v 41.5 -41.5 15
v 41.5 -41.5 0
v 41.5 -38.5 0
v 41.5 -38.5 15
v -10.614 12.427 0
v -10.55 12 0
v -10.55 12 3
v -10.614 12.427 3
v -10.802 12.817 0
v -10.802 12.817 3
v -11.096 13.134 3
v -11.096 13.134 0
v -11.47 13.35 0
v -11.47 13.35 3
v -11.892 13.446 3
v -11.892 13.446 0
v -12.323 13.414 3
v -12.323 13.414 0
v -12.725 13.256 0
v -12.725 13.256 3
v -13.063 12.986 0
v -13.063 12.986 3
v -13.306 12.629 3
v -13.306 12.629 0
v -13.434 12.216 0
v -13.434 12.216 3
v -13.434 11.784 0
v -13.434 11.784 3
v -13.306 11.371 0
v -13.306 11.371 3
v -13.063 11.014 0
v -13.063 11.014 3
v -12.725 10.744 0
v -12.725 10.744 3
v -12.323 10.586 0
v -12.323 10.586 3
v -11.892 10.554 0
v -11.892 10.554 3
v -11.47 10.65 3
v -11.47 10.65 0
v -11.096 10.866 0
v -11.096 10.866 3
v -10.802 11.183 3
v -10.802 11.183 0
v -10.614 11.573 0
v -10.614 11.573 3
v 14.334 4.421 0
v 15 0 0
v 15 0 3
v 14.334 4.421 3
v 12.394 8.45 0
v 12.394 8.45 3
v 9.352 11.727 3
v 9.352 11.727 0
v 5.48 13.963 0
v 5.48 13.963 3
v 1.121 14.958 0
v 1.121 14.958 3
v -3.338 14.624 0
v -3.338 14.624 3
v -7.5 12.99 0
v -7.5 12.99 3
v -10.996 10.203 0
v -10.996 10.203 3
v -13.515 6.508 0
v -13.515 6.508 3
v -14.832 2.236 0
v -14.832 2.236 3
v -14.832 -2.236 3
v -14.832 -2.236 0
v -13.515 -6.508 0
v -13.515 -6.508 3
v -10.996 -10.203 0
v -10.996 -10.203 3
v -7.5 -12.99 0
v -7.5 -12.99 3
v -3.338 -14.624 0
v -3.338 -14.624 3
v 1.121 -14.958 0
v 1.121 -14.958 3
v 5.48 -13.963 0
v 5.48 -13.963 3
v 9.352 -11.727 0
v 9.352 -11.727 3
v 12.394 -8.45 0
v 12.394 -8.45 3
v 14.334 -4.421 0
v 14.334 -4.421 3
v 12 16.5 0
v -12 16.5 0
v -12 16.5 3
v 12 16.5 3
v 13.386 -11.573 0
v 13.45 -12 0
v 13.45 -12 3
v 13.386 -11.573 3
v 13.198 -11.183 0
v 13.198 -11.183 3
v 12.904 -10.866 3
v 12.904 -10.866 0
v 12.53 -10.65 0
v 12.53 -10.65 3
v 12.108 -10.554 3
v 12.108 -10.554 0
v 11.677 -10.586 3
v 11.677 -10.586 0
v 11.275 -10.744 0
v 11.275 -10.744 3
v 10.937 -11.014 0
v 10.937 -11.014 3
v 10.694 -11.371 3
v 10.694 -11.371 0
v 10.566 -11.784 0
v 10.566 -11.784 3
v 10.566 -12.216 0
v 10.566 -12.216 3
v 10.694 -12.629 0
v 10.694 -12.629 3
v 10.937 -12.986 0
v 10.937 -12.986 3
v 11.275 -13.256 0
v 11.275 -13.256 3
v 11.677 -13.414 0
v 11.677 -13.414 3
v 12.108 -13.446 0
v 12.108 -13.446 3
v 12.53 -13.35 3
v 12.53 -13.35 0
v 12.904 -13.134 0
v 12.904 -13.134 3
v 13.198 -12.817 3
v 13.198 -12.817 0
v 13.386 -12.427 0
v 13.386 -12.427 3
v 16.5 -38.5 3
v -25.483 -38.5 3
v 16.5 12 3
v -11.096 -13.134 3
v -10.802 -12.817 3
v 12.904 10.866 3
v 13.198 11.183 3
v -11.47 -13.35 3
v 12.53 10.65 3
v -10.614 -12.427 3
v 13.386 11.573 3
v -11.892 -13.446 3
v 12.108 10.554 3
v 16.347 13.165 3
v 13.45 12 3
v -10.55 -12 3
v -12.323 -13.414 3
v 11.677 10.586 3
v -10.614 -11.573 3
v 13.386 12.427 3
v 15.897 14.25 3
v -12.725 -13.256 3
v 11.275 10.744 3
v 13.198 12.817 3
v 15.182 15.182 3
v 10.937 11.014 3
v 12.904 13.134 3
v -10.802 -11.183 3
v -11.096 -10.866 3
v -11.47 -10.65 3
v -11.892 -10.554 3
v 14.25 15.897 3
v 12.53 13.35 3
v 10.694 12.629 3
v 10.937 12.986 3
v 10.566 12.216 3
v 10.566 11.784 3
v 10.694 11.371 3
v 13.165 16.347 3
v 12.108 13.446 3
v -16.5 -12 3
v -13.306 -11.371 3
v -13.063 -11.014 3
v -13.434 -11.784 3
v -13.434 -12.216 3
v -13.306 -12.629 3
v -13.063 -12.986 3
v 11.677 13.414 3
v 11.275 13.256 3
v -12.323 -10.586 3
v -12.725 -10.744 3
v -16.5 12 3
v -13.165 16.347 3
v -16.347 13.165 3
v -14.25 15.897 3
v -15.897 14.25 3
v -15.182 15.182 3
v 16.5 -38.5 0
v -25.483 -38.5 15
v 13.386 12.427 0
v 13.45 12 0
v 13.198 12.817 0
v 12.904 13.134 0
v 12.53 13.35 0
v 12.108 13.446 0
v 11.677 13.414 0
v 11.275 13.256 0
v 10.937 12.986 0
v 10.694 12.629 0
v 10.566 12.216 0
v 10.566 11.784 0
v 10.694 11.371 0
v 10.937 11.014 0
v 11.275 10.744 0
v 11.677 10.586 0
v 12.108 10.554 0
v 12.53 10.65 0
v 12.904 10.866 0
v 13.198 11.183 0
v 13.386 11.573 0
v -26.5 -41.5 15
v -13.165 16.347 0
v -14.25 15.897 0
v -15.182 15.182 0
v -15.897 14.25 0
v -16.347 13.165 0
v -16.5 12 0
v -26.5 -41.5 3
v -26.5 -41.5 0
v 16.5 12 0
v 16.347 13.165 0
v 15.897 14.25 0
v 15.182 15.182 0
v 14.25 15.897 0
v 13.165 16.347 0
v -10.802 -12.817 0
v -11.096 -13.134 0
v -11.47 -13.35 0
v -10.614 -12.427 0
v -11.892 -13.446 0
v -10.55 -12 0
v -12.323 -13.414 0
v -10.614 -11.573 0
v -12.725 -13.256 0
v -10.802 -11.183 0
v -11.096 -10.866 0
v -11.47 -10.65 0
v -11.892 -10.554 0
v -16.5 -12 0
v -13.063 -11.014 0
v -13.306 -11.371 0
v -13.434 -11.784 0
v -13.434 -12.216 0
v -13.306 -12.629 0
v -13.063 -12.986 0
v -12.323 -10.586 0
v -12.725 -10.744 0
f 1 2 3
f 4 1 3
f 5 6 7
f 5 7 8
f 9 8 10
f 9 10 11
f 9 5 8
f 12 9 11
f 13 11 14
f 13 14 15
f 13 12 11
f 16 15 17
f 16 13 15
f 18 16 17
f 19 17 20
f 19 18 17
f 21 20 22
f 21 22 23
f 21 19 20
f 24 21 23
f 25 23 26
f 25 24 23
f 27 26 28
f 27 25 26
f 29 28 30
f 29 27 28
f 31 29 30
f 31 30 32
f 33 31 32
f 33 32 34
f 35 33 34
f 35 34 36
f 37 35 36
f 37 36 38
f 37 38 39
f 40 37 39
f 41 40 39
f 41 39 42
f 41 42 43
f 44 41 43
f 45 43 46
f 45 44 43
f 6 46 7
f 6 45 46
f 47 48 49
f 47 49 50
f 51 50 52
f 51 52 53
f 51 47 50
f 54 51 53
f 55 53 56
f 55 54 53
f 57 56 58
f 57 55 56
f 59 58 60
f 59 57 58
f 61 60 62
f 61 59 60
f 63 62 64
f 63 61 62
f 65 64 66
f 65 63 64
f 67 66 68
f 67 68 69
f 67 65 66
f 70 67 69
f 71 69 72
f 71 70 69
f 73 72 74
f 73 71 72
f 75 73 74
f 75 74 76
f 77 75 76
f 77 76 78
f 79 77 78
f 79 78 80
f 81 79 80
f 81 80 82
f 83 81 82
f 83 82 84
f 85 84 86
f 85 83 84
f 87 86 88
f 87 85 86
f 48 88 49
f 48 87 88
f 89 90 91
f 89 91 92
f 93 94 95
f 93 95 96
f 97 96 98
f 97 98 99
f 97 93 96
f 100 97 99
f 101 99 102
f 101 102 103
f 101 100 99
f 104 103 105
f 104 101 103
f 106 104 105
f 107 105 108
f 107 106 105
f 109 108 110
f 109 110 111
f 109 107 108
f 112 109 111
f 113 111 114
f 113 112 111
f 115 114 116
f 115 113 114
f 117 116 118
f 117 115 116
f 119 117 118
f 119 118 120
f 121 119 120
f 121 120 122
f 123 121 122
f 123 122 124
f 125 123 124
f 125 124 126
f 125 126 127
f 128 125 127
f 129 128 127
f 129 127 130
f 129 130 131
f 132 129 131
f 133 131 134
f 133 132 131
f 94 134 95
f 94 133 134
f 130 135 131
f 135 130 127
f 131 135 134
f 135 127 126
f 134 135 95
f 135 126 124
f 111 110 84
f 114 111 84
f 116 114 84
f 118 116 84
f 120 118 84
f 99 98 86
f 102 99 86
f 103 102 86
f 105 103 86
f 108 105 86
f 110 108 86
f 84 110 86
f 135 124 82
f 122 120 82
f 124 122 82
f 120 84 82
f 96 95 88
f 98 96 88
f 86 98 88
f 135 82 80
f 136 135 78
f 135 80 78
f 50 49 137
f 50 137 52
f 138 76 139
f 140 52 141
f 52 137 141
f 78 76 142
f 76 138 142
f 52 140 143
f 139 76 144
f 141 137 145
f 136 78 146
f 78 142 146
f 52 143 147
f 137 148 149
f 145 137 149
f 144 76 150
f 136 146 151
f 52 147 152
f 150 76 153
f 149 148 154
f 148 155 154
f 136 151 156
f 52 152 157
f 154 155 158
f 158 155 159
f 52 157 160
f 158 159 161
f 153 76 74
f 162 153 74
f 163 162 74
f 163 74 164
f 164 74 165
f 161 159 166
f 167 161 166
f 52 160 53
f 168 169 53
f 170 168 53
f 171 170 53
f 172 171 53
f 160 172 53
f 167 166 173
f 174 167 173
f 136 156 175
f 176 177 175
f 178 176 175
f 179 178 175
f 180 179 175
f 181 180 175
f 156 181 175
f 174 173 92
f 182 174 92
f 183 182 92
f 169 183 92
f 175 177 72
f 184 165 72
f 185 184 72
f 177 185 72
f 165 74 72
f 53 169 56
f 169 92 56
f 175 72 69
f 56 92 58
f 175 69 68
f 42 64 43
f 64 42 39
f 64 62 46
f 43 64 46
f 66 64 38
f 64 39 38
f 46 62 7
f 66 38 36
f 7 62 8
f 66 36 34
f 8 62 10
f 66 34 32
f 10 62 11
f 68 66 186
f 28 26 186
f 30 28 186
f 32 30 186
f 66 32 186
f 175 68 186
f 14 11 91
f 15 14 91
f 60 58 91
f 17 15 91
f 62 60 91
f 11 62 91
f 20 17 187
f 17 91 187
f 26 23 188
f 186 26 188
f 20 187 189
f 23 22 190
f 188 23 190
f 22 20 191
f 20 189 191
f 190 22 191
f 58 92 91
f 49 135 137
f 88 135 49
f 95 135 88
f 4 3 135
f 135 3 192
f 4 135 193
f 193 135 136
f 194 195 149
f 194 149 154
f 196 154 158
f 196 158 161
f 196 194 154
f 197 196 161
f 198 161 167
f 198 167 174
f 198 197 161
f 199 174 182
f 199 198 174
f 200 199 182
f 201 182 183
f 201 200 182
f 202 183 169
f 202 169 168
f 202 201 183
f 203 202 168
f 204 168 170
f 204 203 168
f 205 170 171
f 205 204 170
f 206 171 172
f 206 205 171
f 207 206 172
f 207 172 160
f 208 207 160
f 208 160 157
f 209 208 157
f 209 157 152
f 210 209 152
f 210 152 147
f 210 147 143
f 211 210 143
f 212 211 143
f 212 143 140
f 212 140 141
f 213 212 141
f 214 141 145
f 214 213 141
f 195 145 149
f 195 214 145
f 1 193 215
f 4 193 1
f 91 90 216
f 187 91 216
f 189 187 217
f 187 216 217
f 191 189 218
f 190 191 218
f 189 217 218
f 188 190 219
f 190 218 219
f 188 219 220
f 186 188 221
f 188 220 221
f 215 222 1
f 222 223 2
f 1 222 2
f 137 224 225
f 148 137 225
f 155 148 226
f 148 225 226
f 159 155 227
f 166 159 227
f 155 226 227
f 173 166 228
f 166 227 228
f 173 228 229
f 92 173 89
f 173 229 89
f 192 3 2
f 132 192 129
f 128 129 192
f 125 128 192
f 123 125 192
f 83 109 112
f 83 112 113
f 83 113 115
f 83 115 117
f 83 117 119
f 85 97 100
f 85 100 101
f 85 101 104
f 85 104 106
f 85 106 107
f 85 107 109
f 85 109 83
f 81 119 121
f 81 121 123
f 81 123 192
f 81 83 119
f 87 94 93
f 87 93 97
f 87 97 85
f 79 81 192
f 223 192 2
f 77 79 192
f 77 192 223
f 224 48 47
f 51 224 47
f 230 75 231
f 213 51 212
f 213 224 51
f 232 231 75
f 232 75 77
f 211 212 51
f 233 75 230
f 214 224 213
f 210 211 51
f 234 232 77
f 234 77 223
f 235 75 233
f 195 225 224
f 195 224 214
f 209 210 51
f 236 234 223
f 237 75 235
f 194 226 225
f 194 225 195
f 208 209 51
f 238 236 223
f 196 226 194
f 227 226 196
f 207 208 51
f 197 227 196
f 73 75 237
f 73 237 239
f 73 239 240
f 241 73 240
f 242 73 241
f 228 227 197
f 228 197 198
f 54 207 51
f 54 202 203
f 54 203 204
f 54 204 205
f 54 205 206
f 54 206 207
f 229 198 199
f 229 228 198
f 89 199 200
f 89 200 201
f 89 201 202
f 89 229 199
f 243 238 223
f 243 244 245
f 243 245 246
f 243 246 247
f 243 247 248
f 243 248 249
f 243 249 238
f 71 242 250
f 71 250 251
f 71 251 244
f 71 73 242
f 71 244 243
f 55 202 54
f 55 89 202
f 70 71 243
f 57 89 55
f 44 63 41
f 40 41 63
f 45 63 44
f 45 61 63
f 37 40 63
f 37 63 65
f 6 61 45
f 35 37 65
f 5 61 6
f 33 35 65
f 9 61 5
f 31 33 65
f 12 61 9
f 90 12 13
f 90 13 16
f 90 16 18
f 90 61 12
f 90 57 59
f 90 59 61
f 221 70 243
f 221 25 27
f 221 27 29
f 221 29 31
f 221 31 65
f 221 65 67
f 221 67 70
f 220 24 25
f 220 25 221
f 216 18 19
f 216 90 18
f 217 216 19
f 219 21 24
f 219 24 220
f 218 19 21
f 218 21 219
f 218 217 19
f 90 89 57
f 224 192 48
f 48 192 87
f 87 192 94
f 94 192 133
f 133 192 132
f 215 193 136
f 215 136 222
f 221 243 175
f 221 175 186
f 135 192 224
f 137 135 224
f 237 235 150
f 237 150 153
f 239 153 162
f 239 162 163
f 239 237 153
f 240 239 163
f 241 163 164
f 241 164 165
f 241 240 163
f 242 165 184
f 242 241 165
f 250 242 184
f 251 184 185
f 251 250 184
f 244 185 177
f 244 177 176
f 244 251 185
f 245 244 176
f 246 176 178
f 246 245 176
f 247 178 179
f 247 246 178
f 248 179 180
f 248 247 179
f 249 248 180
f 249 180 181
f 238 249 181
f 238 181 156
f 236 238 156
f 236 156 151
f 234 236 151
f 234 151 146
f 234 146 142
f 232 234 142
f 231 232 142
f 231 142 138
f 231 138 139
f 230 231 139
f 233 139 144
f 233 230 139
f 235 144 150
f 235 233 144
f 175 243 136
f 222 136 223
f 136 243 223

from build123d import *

# Parameters (mm, degrees)
SKETCH_R     = 1.45
SKETCH_R_2   = 15
PAD_DEPTH    = 3
PAD001_DEPTH = 12


with BuildPart() as part:
    # Sketch → Pad (new body)
    with BuildSketch(Plane.XY):
        with BuildLine():
            Line((-12, 16.5), (12, 16.5))
            ThreePointArc((16.5, 12), (15.181981, 15.181981), (12, 16.5))
            Line((16.5, 12), (16.5, -12))
            Line((16.5, -38.5), (16.5, -12))
            Line((41.5, -38.5), (16.5, -38.5))
            Line((41.5, -41.5), (41.5, -38.5))
            Line((-26.5, -41.5), (41.5, -41.5))
            Line((-16.5, -12), (-26.5, -41.5))
            Line((-16.5, -12), (-16.5, 12))
            ThreePointArc((-12, 16.5), (-15.181981, 15.181981), (-16.5, 12))
        make_face()
        with Locations((-12, 12)):
            Circle(SKETCH_R, mode=Mode.SUBTRACT)
        with Locations((12, 12)):
            Circle(SKETCH_R, mode=Mode.SUBTRACT)
        with Locations((-12, -12)):
            Circle(SKETCH_R, mode=Mode.SUBTRACT)
        with Locations((12, -12)):
            Circle(SKETCH_R, mode=Mode.SUBTRACT)
        Circle(SKETCH_R_2, mode=Mode.SUBTRACT)
    extrude(amount=PAD_DEPTH)

    # Sketch001 (on DatumPlane) → Pad001 (join)
    with BuildSketch(Plane.XY.offset(3)):
        Polygon((41.5, -38.5), (-25.483051, -38.5), (-26.5, -41.5), (41.5, -41.5), align=None)
    extrude(amount=PAD001_DEPTH)


solid = part.part
